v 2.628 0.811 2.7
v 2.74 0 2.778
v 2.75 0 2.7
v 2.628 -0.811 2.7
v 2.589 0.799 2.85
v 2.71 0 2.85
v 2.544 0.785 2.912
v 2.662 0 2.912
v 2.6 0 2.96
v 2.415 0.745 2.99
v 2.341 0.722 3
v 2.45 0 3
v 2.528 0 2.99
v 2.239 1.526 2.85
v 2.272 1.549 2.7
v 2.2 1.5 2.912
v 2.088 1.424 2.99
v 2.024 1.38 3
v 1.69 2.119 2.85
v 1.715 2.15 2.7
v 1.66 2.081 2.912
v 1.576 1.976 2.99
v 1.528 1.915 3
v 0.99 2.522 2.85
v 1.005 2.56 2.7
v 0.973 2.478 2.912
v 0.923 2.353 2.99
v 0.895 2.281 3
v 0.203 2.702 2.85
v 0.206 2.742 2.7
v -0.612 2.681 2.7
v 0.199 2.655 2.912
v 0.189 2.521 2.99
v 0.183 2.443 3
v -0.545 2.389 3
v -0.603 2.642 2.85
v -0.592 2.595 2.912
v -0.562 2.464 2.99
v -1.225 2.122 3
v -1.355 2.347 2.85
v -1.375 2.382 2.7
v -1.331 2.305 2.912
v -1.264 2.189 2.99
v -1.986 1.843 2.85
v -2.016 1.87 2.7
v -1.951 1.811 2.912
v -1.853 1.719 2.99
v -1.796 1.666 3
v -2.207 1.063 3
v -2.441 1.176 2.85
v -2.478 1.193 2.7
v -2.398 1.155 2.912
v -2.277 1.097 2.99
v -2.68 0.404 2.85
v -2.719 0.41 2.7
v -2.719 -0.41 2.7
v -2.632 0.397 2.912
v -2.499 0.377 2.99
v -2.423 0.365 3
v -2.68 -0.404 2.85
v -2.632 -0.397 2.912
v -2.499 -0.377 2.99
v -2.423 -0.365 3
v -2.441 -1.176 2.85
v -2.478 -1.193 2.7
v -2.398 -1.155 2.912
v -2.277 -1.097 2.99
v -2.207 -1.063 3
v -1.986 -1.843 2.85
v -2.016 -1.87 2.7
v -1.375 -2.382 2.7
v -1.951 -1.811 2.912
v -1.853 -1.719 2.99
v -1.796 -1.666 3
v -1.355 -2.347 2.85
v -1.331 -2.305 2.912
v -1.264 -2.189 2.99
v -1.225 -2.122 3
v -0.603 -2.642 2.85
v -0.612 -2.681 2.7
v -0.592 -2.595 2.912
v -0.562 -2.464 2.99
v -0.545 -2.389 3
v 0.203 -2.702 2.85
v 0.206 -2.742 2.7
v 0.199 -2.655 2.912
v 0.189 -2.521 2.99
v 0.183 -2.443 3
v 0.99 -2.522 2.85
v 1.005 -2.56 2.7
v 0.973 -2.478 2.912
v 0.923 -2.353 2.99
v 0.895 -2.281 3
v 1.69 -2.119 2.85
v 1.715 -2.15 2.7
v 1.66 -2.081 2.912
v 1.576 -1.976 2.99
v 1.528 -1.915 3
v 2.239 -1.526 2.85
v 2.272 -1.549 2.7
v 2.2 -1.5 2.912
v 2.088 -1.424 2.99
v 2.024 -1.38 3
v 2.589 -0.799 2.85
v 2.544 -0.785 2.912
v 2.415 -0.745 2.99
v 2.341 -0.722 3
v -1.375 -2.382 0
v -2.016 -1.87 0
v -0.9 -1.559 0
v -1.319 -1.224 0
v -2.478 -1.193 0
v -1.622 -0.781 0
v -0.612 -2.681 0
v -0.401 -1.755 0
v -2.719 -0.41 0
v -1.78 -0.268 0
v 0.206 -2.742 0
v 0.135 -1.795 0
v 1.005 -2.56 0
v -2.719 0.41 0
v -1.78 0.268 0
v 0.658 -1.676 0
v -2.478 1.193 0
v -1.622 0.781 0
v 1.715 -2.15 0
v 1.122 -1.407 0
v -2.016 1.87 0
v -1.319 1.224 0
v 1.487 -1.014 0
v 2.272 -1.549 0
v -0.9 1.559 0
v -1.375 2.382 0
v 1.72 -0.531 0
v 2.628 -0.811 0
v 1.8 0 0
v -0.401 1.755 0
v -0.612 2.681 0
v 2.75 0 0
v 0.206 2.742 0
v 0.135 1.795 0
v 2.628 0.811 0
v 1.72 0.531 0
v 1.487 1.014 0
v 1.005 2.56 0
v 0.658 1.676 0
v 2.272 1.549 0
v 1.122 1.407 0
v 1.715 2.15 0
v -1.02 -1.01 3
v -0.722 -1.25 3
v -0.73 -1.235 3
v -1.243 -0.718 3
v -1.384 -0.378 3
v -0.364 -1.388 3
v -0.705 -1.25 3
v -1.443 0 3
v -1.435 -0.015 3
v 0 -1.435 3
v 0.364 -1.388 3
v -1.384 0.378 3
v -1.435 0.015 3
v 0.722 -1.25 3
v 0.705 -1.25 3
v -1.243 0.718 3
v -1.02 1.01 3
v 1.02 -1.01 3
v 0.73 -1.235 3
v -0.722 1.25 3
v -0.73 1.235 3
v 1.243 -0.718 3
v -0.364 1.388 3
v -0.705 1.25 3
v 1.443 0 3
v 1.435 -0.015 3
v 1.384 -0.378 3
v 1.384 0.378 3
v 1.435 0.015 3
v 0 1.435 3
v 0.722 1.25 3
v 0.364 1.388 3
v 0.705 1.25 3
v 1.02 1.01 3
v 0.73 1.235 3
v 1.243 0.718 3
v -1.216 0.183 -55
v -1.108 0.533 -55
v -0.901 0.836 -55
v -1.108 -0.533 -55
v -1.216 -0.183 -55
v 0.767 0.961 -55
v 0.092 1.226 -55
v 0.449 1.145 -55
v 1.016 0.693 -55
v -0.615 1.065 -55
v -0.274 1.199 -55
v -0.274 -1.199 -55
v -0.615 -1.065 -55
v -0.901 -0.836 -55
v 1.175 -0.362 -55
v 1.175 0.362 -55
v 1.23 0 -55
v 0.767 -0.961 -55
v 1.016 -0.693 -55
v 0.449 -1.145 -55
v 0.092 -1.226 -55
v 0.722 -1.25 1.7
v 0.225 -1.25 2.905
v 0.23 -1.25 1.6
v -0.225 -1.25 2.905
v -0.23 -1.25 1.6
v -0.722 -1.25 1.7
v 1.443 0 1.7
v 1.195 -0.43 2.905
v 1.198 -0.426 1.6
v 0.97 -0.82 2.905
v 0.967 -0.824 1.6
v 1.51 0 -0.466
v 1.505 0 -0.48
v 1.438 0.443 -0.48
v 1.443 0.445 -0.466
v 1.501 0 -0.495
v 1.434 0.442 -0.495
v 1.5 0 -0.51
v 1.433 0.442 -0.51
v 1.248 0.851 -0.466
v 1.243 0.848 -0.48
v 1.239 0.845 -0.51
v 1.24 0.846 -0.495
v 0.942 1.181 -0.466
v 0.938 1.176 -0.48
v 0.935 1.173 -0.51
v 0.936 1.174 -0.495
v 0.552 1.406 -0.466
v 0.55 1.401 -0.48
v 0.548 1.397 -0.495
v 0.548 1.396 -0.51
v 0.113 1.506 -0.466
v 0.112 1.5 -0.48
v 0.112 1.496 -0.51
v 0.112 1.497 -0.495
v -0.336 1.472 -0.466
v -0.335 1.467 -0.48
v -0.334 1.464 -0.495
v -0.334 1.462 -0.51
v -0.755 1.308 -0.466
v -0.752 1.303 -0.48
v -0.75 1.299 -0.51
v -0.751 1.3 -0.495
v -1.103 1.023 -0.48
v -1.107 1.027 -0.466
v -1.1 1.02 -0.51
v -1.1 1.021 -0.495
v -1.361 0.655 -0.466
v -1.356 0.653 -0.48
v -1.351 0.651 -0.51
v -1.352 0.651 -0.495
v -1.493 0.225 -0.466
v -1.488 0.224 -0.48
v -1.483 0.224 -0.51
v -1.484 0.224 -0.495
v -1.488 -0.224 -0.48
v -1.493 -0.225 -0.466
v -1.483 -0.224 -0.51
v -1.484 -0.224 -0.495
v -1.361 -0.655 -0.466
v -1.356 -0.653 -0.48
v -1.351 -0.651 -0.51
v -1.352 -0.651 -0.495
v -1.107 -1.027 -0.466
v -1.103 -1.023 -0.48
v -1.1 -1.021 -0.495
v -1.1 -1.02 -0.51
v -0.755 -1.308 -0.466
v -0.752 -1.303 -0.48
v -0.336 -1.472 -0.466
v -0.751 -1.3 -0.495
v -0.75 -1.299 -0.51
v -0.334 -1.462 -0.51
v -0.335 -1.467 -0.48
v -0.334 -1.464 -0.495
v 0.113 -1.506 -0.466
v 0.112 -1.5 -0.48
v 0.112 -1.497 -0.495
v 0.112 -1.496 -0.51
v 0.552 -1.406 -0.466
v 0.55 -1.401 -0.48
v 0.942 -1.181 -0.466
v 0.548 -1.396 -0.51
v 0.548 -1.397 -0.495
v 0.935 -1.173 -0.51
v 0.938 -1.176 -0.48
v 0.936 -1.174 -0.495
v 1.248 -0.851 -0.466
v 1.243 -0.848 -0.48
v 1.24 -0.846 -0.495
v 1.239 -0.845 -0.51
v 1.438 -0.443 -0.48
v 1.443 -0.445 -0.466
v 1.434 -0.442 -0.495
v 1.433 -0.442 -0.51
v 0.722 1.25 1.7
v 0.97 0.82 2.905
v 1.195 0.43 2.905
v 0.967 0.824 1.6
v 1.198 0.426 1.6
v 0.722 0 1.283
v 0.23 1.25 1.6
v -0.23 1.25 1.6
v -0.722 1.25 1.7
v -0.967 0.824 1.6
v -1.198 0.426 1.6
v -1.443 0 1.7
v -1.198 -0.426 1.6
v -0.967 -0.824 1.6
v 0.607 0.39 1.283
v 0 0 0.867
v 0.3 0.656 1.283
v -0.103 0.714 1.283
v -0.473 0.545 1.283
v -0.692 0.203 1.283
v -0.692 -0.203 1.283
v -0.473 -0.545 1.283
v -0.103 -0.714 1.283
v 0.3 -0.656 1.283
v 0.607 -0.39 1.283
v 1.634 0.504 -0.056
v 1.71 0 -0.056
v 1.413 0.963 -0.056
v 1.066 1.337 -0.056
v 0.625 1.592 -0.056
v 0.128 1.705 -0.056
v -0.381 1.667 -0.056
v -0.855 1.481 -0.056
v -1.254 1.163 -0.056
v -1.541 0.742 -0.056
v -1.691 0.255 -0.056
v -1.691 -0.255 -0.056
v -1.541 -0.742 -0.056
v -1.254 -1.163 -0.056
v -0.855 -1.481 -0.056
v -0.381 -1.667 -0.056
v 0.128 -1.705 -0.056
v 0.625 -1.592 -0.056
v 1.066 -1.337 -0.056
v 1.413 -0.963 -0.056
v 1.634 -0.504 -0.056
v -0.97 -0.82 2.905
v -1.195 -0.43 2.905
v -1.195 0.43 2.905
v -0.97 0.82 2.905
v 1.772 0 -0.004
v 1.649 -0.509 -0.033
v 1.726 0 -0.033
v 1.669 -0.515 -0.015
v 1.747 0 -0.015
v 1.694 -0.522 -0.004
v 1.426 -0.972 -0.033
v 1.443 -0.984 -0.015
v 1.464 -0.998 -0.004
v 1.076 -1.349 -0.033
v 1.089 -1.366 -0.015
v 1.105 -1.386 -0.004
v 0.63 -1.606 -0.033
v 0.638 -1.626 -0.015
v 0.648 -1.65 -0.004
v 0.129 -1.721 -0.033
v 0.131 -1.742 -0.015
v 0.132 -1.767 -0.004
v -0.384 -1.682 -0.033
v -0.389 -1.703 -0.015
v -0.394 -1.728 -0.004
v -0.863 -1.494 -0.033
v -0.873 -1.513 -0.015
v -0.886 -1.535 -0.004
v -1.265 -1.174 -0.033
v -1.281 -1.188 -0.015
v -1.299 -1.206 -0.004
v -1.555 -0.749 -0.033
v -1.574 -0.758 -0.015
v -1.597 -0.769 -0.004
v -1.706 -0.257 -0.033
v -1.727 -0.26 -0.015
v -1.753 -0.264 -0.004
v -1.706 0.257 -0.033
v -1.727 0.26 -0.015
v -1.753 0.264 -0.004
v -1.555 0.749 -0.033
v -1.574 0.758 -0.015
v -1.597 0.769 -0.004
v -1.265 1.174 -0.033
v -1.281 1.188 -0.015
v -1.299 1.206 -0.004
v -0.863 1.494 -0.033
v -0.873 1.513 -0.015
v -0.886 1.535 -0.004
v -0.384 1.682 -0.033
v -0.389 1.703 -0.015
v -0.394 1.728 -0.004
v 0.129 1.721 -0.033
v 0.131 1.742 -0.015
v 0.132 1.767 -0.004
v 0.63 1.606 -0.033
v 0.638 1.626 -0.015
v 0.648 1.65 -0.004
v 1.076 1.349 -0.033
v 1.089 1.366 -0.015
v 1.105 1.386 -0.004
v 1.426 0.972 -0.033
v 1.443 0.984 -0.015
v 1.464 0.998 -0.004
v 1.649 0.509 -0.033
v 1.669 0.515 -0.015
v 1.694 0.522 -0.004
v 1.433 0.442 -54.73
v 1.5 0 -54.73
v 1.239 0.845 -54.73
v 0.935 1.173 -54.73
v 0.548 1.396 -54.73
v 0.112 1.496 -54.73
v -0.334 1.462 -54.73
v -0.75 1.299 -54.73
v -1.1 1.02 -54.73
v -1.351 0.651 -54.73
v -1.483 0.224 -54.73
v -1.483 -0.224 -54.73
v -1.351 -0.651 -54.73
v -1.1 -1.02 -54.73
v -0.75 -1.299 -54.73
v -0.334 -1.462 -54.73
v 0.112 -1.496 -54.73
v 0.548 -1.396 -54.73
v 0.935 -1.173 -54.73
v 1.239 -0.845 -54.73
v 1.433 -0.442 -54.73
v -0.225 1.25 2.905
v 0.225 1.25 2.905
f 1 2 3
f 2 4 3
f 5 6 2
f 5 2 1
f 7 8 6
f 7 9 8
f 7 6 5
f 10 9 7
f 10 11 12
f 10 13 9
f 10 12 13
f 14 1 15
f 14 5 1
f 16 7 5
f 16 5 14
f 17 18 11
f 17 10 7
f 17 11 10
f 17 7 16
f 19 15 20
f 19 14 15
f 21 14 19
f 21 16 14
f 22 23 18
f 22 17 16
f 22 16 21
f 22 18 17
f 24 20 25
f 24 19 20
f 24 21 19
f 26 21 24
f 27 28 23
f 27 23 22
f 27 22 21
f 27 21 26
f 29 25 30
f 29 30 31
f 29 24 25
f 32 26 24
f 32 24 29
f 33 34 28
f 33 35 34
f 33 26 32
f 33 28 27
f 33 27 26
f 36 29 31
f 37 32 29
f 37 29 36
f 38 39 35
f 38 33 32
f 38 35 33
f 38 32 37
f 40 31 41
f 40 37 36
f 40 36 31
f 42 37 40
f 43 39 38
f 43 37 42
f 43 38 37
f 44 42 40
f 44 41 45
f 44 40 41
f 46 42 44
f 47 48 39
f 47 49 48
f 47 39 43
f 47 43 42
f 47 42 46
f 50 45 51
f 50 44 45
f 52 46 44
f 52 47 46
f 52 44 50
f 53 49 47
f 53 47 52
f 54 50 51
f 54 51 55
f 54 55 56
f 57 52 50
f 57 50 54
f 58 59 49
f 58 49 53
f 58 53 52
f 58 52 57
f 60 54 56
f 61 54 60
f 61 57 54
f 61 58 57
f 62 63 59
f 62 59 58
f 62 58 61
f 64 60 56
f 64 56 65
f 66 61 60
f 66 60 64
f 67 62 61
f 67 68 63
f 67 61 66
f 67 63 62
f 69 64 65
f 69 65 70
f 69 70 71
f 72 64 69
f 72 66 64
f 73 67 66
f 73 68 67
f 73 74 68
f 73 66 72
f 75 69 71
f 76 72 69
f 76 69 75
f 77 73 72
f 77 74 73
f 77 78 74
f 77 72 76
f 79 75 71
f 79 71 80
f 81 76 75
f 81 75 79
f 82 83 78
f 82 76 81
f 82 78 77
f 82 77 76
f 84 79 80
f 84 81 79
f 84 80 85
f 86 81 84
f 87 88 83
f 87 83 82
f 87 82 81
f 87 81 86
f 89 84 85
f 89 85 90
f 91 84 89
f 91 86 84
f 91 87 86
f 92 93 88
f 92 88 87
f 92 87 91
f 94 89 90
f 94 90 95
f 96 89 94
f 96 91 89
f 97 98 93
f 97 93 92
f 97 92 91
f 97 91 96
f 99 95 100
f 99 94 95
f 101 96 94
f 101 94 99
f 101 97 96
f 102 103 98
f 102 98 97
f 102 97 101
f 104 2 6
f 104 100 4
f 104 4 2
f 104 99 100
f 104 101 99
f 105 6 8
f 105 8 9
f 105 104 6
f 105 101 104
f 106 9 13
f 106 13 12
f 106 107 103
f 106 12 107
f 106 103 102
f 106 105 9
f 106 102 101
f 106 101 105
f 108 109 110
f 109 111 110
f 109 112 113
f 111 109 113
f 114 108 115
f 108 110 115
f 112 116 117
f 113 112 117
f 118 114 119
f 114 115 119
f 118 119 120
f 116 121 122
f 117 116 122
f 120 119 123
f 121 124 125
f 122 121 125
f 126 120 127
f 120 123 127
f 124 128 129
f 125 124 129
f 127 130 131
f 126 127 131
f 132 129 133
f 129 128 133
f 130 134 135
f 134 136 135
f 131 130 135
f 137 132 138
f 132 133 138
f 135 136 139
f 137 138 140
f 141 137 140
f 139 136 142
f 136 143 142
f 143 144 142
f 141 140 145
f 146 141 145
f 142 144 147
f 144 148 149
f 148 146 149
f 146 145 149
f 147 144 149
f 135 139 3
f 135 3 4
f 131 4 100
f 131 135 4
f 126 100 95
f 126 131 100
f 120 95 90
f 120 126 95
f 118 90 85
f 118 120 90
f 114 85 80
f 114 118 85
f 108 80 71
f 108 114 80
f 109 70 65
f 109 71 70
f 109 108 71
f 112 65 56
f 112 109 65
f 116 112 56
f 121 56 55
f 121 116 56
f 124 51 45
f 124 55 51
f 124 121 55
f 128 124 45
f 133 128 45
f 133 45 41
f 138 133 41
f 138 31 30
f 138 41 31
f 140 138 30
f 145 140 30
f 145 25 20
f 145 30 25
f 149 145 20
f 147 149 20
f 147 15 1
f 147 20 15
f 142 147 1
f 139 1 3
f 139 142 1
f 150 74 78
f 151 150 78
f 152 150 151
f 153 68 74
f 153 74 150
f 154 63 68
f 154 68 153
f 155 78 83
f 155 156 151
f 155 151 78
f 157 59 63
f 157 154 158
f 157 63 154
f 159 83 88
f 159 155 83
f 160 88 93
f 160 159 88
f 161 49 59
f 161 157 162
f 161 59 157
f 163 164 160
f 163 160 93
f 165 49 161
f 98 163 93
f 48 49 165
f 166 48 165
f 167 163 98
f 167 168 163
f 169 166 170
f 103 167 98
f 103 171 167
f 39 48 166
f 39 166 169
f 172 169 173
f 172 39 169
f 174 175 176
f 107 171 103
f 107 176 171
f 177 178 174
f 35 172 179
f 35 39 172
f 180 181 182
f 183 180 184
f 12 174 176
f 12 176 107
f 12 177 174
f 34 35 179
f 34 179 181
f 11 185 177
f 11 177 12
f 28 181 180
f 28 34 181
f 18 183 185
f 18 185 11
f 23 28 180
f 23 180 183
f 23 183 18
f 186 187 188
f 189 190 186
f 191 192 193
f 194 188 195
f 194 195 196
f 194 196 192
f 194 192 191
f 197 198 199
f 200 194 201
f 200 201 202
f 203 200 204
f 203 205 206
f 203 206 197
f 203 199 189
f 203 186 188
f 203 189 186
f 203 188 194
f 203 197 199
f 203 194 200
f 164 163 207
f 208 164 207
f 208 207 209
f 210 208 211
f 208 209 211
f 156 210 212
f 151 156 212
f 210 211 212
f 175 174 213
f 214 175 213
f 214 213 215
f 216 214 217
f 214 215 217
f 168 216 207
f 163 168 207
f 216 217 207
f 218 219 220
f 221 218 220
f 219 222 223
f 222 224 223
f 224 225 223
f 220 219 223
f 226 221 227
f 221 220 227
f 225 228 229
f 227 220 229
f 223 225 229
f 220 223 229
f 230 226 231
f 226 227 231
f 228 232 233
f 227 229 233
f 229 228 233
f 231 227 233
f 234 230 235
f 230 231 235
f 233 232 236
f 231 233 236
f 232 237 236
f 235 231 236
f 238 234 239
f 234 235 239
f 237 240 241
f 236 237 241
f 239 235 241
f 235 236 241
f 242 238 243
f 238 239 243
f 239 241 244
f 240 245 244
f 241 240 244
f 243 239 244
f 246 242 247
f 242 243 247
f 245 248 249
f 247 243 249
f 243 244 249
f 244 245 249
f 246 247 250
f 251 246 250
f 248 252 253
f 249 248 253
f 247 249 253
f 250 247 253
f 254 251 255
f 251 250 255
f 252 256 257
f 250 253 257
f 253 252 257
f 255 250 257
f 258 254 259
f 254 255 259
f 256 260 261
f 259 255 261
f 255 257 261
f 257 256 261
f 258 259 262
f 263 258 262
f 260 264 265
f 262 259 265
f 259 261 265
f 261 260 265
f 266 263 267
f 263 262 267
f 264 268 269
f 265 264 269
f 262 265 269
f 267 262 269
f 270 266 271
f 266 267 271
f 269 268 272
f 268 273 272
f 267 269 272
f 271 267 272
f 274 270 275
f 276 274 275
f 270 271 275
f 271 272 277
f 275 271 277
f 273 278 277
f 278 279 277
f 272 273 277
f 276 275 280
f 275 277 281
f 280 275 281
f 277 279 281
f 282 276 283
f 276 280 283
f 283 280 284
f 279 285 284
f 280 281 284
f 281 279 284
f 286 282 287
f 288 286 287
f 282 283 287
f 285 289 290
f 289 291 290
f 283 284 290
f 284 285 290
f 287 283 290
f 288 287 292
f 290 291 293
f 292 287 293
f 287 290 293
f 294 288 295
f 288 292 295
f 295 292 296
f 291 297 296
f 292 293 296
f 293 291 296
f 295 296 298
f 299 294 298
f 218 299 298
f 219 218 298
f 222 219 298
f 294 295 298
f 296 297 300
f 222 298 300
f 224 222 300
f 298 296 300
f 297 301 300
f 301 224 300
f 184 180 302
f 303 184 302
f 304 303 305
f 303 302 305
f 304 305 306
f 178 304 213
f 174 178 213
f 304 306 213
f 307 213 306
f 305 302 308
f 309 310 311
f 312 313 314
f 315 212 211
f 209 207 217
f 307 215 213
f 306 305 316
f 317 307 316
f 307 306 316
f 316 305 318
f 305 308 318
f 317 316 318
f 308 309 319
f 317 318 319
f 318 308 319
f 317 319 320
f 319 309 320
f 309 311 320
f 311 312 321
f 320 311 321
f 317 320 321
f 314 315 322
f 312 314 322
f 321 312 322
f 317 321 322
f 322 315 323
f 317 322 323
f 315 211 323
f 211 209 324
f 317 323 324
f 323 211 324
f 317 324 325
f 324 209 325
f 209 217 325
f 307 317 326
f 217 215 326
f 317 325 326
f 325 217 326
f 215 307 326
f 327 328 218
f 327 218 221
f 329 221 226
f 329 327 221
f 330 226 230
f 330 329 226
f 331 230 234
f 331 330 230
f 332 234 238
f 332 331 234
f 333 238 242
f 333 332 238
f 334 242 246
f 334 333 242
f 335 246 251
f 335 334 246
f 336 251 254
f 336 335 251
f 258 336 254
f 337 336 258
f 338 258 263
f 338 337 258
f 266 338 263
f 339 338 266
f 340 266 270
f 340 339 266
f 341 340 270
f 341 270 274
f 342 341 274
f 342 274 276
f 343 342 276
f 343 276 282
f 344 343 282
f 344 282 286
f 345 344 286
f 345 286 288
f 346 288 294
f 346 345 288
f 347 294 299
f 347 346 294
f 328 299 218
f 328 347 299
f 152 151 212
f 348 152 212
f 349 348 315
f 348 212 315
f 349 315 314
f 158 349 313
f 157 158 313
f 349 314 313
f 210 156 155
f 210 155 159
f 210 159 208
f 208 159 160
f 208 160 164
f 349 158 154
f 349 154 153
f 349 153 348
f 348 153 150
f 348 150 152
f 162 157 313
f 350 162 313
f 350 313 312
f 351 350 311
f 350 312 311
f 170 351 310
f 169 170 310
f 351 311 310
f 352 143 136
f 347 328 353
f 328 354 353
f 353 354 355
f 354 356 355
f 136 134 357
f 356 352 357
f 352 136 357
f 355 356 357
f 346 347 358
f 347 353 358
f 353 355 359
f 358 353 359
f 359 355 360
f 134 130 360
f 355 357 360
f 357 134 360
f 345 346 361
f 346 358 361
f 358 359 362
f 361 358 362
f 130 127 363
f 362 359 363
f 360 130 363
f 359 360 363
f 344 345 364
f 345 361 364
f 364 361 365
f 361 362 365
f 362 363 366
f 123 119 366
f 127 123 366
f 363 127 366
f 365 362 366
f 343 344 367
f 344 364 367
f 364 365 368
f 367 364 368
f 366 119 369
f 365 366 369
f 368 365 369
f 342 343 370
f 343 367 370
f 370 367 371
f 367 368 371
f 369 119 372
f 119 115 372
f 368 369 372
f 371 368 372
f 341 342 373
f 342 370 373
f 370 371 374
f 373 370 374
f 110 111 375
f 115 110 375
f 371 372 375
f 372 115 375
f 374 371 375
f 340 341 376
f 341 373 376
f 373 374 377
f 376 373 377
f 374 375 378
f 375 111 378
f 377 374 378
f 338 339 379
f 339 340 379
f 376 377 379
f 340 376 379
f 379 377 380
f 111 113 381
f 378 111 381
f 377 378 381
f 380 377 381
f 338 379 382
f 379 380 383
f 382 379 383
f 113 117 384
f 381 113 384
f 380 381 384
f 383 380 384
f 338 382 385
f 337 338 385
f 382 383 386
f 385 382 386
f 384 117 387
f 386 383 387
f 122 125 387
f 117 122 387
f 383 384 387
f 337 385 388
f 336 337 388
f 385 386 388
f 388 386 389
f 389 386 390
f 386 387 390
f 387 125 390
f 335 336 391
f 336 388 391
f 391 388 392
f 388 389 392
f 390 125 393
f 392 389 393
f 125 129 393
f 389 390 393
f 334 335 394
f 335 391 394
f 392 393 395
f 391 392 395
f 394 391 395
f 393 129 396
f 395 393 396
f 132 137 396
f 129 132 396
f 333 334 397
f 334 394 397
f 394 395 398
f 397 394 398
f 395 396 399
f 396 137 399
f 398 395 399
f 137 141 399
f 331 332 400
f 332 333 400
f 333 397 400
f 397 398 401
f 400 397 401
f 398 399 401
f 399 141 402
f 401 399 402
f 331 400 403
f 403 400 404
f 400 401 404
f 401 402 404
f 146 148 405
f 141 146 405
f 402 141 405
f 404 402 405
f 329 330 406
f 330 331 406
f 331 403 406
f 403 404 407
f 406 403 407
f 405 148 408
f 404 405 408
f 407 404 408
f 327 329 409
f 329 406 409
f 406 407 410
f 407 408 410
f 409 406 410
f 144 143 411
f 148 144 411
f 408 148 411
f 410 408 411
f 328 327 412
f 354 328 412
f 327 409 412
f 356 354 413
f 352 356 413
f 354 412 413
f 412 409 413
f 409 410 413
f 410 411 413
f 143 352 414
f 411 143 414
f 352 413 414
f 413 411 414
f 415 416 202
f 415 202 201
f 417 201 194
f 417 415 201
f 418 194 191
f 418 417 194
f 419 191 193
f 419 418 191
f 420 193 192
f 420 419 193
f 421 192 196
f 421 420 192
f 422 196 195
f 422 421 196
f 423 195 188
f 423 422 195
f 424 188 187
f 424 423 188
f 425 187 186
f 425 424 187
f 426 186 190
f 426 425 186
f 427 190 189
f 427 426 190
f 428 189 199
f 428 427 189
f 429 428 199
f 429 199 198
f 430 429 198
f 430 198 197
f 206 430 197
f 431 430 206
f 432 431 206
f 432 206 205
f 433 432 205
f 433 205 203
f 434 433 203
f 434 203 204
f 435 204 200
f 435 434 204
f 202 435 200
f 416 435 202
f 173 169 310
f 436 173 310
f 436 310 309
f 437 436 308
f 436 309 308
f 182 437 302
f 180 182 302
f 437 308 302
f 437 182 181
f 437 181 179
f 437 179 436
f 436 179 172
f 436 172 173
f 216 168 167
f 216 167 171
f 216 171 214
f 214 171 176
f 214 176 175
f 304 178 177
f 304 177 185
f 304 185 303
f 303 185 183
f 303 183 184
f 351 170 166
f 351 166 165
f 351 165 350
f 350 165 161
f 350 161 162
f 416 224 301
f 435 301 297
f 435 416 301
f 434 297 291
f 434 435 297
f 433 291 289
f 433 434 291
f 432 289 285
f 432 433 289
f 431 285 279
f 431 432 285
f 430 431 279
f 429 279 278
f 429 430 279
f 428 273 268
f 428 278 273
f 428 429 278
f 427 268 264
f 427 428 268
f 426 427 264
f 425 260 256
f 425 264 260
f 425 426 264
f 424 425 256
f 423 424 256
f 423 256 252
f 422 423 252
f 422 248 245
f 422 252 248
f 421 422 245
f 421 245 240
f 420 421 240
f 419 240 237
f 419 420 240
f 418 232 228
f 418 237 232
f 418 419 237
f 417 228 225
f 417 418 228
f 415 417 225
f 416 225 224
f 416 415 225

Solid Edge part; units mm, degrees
sketch "Sketch1" plane through (0, 0, 0) normal (0, 0, 1) x (1, 0, 0)
  line L0 (-0.7217, 1.25) -> (0.7217, 1.25)
  line L1 (0.7217, 1.25) -> (1.4434, 0)
  line L2 (1.4434, 0) -> (0.7217, -1.25)
  line L3 (0.7217, -1.25) -> (-0.7217, -1.25)
  line L4 (-0.7217, -1.25) -> (-1.4434, 0)
  line L5 (-1.4434, 0) -> (-0.7217, 1.25)
  circle A0 centre (0, 0) radius 2.75
  dimension "D1" = 5.5
  dimension "D2" = 2.5
extrude "Protrusion1" add sketch "Sketch1" along normal blind 3
sketch "Sketch2" plane through (0, 0, 0) normal (0, -1, 0) x (1, 0, 0)
  line L0 (0, 0.8667) -> (1.4434, 1.7)
  line L1 (1.4434, 1.7) -> (2.75, 1.7)
  line L2 (2.75, 1.7) -> (2.75, 0)
  line L3 (2.75, 0) -> (1.5, 0)
  line L4 (1.5, 0) -> (1.5, -36.999)
  line L5 (1.5, -36.999) -> (1.5, -37) construction
  line L6 (1.5, -37) -> (1.5, -37) construction
  line L7 (1.5, -37) -> (1.5, -55)
  line L8 (0, -55) -> (1.5, -55)
  dimension "D1" = 18
  dimension "D2" = 1.5
  dimension "D3" = 1.5
  dimension "D4" = 2.75
  dimension "D5" = 1.7
  dimension "D6" = 56.7
  dimension "D7" = 0.001
  dimension "D8" = 1.25
  dimension "D9" = 1.25
revolve "RevolvedProtrusion_1" add sketch "Sketch2" angle 360 about axis through (0, 0, 2.3333) along (0, 0, -1)
cosmetic_thread "Thread_1" size "M3" thread depth 17.999
sketch "Sketch3" plane through (0, 0, 0) normal (0, -1, 0) x (1, 0, 0)
  line L0 (0, 4) -> (1.435, 4)
  line L1 (1.435, 4) -> (1.435, 3)
  line L2 (1.435, 3) -> (0, 2.1715)
  dimension "D1" = 1.435
  dimension "D2" = 1
  dimension "D3" = 4
revolve "RevolvedCutout_1" cut sketch "Sketch3" angle 360 about axis through (0, 0, 7.1999) along (0, 0, 1)
fillet "Round_1" radius 0.3 1 edges at (-2.75, 0, 3)
sketch "Sketch4" plane through (0, 0, 0) normal (0, -1, 0) x (1, 0, 0)
  line L0 (1.5, 0) -> (1.8, 0)
  arc A0 (1.7101, -0.0562) -> (1.8, 0) centre (1.8, -0.1) cw
  line L1 (1.5101, -0.4662) -> (1.7101, -0.0562)
  arc A1 (1.5101, -0.4662) -> (1.5, -0.51) centre (1.6, -0.51) ccw
  line L2 (1.5, 0) -> (1.5, -0.51)
  dimension "D1" = 0.51
  dimension "D2" = 1.5
  dimension "D3" = 0.51
  dimension "D4" = 0.3
  dimension "D5" = 0.1
revolve "RevolvedProtrusion_2" add sketch "Sketch4" angle 360 about axis through (0, 0, -1.02) along (0, 0, 1)
chamfer "Chamfer_1" distance 0.2705 angle 45 1 edges at (-1.5, 0, -55)
properties material "Steel"
